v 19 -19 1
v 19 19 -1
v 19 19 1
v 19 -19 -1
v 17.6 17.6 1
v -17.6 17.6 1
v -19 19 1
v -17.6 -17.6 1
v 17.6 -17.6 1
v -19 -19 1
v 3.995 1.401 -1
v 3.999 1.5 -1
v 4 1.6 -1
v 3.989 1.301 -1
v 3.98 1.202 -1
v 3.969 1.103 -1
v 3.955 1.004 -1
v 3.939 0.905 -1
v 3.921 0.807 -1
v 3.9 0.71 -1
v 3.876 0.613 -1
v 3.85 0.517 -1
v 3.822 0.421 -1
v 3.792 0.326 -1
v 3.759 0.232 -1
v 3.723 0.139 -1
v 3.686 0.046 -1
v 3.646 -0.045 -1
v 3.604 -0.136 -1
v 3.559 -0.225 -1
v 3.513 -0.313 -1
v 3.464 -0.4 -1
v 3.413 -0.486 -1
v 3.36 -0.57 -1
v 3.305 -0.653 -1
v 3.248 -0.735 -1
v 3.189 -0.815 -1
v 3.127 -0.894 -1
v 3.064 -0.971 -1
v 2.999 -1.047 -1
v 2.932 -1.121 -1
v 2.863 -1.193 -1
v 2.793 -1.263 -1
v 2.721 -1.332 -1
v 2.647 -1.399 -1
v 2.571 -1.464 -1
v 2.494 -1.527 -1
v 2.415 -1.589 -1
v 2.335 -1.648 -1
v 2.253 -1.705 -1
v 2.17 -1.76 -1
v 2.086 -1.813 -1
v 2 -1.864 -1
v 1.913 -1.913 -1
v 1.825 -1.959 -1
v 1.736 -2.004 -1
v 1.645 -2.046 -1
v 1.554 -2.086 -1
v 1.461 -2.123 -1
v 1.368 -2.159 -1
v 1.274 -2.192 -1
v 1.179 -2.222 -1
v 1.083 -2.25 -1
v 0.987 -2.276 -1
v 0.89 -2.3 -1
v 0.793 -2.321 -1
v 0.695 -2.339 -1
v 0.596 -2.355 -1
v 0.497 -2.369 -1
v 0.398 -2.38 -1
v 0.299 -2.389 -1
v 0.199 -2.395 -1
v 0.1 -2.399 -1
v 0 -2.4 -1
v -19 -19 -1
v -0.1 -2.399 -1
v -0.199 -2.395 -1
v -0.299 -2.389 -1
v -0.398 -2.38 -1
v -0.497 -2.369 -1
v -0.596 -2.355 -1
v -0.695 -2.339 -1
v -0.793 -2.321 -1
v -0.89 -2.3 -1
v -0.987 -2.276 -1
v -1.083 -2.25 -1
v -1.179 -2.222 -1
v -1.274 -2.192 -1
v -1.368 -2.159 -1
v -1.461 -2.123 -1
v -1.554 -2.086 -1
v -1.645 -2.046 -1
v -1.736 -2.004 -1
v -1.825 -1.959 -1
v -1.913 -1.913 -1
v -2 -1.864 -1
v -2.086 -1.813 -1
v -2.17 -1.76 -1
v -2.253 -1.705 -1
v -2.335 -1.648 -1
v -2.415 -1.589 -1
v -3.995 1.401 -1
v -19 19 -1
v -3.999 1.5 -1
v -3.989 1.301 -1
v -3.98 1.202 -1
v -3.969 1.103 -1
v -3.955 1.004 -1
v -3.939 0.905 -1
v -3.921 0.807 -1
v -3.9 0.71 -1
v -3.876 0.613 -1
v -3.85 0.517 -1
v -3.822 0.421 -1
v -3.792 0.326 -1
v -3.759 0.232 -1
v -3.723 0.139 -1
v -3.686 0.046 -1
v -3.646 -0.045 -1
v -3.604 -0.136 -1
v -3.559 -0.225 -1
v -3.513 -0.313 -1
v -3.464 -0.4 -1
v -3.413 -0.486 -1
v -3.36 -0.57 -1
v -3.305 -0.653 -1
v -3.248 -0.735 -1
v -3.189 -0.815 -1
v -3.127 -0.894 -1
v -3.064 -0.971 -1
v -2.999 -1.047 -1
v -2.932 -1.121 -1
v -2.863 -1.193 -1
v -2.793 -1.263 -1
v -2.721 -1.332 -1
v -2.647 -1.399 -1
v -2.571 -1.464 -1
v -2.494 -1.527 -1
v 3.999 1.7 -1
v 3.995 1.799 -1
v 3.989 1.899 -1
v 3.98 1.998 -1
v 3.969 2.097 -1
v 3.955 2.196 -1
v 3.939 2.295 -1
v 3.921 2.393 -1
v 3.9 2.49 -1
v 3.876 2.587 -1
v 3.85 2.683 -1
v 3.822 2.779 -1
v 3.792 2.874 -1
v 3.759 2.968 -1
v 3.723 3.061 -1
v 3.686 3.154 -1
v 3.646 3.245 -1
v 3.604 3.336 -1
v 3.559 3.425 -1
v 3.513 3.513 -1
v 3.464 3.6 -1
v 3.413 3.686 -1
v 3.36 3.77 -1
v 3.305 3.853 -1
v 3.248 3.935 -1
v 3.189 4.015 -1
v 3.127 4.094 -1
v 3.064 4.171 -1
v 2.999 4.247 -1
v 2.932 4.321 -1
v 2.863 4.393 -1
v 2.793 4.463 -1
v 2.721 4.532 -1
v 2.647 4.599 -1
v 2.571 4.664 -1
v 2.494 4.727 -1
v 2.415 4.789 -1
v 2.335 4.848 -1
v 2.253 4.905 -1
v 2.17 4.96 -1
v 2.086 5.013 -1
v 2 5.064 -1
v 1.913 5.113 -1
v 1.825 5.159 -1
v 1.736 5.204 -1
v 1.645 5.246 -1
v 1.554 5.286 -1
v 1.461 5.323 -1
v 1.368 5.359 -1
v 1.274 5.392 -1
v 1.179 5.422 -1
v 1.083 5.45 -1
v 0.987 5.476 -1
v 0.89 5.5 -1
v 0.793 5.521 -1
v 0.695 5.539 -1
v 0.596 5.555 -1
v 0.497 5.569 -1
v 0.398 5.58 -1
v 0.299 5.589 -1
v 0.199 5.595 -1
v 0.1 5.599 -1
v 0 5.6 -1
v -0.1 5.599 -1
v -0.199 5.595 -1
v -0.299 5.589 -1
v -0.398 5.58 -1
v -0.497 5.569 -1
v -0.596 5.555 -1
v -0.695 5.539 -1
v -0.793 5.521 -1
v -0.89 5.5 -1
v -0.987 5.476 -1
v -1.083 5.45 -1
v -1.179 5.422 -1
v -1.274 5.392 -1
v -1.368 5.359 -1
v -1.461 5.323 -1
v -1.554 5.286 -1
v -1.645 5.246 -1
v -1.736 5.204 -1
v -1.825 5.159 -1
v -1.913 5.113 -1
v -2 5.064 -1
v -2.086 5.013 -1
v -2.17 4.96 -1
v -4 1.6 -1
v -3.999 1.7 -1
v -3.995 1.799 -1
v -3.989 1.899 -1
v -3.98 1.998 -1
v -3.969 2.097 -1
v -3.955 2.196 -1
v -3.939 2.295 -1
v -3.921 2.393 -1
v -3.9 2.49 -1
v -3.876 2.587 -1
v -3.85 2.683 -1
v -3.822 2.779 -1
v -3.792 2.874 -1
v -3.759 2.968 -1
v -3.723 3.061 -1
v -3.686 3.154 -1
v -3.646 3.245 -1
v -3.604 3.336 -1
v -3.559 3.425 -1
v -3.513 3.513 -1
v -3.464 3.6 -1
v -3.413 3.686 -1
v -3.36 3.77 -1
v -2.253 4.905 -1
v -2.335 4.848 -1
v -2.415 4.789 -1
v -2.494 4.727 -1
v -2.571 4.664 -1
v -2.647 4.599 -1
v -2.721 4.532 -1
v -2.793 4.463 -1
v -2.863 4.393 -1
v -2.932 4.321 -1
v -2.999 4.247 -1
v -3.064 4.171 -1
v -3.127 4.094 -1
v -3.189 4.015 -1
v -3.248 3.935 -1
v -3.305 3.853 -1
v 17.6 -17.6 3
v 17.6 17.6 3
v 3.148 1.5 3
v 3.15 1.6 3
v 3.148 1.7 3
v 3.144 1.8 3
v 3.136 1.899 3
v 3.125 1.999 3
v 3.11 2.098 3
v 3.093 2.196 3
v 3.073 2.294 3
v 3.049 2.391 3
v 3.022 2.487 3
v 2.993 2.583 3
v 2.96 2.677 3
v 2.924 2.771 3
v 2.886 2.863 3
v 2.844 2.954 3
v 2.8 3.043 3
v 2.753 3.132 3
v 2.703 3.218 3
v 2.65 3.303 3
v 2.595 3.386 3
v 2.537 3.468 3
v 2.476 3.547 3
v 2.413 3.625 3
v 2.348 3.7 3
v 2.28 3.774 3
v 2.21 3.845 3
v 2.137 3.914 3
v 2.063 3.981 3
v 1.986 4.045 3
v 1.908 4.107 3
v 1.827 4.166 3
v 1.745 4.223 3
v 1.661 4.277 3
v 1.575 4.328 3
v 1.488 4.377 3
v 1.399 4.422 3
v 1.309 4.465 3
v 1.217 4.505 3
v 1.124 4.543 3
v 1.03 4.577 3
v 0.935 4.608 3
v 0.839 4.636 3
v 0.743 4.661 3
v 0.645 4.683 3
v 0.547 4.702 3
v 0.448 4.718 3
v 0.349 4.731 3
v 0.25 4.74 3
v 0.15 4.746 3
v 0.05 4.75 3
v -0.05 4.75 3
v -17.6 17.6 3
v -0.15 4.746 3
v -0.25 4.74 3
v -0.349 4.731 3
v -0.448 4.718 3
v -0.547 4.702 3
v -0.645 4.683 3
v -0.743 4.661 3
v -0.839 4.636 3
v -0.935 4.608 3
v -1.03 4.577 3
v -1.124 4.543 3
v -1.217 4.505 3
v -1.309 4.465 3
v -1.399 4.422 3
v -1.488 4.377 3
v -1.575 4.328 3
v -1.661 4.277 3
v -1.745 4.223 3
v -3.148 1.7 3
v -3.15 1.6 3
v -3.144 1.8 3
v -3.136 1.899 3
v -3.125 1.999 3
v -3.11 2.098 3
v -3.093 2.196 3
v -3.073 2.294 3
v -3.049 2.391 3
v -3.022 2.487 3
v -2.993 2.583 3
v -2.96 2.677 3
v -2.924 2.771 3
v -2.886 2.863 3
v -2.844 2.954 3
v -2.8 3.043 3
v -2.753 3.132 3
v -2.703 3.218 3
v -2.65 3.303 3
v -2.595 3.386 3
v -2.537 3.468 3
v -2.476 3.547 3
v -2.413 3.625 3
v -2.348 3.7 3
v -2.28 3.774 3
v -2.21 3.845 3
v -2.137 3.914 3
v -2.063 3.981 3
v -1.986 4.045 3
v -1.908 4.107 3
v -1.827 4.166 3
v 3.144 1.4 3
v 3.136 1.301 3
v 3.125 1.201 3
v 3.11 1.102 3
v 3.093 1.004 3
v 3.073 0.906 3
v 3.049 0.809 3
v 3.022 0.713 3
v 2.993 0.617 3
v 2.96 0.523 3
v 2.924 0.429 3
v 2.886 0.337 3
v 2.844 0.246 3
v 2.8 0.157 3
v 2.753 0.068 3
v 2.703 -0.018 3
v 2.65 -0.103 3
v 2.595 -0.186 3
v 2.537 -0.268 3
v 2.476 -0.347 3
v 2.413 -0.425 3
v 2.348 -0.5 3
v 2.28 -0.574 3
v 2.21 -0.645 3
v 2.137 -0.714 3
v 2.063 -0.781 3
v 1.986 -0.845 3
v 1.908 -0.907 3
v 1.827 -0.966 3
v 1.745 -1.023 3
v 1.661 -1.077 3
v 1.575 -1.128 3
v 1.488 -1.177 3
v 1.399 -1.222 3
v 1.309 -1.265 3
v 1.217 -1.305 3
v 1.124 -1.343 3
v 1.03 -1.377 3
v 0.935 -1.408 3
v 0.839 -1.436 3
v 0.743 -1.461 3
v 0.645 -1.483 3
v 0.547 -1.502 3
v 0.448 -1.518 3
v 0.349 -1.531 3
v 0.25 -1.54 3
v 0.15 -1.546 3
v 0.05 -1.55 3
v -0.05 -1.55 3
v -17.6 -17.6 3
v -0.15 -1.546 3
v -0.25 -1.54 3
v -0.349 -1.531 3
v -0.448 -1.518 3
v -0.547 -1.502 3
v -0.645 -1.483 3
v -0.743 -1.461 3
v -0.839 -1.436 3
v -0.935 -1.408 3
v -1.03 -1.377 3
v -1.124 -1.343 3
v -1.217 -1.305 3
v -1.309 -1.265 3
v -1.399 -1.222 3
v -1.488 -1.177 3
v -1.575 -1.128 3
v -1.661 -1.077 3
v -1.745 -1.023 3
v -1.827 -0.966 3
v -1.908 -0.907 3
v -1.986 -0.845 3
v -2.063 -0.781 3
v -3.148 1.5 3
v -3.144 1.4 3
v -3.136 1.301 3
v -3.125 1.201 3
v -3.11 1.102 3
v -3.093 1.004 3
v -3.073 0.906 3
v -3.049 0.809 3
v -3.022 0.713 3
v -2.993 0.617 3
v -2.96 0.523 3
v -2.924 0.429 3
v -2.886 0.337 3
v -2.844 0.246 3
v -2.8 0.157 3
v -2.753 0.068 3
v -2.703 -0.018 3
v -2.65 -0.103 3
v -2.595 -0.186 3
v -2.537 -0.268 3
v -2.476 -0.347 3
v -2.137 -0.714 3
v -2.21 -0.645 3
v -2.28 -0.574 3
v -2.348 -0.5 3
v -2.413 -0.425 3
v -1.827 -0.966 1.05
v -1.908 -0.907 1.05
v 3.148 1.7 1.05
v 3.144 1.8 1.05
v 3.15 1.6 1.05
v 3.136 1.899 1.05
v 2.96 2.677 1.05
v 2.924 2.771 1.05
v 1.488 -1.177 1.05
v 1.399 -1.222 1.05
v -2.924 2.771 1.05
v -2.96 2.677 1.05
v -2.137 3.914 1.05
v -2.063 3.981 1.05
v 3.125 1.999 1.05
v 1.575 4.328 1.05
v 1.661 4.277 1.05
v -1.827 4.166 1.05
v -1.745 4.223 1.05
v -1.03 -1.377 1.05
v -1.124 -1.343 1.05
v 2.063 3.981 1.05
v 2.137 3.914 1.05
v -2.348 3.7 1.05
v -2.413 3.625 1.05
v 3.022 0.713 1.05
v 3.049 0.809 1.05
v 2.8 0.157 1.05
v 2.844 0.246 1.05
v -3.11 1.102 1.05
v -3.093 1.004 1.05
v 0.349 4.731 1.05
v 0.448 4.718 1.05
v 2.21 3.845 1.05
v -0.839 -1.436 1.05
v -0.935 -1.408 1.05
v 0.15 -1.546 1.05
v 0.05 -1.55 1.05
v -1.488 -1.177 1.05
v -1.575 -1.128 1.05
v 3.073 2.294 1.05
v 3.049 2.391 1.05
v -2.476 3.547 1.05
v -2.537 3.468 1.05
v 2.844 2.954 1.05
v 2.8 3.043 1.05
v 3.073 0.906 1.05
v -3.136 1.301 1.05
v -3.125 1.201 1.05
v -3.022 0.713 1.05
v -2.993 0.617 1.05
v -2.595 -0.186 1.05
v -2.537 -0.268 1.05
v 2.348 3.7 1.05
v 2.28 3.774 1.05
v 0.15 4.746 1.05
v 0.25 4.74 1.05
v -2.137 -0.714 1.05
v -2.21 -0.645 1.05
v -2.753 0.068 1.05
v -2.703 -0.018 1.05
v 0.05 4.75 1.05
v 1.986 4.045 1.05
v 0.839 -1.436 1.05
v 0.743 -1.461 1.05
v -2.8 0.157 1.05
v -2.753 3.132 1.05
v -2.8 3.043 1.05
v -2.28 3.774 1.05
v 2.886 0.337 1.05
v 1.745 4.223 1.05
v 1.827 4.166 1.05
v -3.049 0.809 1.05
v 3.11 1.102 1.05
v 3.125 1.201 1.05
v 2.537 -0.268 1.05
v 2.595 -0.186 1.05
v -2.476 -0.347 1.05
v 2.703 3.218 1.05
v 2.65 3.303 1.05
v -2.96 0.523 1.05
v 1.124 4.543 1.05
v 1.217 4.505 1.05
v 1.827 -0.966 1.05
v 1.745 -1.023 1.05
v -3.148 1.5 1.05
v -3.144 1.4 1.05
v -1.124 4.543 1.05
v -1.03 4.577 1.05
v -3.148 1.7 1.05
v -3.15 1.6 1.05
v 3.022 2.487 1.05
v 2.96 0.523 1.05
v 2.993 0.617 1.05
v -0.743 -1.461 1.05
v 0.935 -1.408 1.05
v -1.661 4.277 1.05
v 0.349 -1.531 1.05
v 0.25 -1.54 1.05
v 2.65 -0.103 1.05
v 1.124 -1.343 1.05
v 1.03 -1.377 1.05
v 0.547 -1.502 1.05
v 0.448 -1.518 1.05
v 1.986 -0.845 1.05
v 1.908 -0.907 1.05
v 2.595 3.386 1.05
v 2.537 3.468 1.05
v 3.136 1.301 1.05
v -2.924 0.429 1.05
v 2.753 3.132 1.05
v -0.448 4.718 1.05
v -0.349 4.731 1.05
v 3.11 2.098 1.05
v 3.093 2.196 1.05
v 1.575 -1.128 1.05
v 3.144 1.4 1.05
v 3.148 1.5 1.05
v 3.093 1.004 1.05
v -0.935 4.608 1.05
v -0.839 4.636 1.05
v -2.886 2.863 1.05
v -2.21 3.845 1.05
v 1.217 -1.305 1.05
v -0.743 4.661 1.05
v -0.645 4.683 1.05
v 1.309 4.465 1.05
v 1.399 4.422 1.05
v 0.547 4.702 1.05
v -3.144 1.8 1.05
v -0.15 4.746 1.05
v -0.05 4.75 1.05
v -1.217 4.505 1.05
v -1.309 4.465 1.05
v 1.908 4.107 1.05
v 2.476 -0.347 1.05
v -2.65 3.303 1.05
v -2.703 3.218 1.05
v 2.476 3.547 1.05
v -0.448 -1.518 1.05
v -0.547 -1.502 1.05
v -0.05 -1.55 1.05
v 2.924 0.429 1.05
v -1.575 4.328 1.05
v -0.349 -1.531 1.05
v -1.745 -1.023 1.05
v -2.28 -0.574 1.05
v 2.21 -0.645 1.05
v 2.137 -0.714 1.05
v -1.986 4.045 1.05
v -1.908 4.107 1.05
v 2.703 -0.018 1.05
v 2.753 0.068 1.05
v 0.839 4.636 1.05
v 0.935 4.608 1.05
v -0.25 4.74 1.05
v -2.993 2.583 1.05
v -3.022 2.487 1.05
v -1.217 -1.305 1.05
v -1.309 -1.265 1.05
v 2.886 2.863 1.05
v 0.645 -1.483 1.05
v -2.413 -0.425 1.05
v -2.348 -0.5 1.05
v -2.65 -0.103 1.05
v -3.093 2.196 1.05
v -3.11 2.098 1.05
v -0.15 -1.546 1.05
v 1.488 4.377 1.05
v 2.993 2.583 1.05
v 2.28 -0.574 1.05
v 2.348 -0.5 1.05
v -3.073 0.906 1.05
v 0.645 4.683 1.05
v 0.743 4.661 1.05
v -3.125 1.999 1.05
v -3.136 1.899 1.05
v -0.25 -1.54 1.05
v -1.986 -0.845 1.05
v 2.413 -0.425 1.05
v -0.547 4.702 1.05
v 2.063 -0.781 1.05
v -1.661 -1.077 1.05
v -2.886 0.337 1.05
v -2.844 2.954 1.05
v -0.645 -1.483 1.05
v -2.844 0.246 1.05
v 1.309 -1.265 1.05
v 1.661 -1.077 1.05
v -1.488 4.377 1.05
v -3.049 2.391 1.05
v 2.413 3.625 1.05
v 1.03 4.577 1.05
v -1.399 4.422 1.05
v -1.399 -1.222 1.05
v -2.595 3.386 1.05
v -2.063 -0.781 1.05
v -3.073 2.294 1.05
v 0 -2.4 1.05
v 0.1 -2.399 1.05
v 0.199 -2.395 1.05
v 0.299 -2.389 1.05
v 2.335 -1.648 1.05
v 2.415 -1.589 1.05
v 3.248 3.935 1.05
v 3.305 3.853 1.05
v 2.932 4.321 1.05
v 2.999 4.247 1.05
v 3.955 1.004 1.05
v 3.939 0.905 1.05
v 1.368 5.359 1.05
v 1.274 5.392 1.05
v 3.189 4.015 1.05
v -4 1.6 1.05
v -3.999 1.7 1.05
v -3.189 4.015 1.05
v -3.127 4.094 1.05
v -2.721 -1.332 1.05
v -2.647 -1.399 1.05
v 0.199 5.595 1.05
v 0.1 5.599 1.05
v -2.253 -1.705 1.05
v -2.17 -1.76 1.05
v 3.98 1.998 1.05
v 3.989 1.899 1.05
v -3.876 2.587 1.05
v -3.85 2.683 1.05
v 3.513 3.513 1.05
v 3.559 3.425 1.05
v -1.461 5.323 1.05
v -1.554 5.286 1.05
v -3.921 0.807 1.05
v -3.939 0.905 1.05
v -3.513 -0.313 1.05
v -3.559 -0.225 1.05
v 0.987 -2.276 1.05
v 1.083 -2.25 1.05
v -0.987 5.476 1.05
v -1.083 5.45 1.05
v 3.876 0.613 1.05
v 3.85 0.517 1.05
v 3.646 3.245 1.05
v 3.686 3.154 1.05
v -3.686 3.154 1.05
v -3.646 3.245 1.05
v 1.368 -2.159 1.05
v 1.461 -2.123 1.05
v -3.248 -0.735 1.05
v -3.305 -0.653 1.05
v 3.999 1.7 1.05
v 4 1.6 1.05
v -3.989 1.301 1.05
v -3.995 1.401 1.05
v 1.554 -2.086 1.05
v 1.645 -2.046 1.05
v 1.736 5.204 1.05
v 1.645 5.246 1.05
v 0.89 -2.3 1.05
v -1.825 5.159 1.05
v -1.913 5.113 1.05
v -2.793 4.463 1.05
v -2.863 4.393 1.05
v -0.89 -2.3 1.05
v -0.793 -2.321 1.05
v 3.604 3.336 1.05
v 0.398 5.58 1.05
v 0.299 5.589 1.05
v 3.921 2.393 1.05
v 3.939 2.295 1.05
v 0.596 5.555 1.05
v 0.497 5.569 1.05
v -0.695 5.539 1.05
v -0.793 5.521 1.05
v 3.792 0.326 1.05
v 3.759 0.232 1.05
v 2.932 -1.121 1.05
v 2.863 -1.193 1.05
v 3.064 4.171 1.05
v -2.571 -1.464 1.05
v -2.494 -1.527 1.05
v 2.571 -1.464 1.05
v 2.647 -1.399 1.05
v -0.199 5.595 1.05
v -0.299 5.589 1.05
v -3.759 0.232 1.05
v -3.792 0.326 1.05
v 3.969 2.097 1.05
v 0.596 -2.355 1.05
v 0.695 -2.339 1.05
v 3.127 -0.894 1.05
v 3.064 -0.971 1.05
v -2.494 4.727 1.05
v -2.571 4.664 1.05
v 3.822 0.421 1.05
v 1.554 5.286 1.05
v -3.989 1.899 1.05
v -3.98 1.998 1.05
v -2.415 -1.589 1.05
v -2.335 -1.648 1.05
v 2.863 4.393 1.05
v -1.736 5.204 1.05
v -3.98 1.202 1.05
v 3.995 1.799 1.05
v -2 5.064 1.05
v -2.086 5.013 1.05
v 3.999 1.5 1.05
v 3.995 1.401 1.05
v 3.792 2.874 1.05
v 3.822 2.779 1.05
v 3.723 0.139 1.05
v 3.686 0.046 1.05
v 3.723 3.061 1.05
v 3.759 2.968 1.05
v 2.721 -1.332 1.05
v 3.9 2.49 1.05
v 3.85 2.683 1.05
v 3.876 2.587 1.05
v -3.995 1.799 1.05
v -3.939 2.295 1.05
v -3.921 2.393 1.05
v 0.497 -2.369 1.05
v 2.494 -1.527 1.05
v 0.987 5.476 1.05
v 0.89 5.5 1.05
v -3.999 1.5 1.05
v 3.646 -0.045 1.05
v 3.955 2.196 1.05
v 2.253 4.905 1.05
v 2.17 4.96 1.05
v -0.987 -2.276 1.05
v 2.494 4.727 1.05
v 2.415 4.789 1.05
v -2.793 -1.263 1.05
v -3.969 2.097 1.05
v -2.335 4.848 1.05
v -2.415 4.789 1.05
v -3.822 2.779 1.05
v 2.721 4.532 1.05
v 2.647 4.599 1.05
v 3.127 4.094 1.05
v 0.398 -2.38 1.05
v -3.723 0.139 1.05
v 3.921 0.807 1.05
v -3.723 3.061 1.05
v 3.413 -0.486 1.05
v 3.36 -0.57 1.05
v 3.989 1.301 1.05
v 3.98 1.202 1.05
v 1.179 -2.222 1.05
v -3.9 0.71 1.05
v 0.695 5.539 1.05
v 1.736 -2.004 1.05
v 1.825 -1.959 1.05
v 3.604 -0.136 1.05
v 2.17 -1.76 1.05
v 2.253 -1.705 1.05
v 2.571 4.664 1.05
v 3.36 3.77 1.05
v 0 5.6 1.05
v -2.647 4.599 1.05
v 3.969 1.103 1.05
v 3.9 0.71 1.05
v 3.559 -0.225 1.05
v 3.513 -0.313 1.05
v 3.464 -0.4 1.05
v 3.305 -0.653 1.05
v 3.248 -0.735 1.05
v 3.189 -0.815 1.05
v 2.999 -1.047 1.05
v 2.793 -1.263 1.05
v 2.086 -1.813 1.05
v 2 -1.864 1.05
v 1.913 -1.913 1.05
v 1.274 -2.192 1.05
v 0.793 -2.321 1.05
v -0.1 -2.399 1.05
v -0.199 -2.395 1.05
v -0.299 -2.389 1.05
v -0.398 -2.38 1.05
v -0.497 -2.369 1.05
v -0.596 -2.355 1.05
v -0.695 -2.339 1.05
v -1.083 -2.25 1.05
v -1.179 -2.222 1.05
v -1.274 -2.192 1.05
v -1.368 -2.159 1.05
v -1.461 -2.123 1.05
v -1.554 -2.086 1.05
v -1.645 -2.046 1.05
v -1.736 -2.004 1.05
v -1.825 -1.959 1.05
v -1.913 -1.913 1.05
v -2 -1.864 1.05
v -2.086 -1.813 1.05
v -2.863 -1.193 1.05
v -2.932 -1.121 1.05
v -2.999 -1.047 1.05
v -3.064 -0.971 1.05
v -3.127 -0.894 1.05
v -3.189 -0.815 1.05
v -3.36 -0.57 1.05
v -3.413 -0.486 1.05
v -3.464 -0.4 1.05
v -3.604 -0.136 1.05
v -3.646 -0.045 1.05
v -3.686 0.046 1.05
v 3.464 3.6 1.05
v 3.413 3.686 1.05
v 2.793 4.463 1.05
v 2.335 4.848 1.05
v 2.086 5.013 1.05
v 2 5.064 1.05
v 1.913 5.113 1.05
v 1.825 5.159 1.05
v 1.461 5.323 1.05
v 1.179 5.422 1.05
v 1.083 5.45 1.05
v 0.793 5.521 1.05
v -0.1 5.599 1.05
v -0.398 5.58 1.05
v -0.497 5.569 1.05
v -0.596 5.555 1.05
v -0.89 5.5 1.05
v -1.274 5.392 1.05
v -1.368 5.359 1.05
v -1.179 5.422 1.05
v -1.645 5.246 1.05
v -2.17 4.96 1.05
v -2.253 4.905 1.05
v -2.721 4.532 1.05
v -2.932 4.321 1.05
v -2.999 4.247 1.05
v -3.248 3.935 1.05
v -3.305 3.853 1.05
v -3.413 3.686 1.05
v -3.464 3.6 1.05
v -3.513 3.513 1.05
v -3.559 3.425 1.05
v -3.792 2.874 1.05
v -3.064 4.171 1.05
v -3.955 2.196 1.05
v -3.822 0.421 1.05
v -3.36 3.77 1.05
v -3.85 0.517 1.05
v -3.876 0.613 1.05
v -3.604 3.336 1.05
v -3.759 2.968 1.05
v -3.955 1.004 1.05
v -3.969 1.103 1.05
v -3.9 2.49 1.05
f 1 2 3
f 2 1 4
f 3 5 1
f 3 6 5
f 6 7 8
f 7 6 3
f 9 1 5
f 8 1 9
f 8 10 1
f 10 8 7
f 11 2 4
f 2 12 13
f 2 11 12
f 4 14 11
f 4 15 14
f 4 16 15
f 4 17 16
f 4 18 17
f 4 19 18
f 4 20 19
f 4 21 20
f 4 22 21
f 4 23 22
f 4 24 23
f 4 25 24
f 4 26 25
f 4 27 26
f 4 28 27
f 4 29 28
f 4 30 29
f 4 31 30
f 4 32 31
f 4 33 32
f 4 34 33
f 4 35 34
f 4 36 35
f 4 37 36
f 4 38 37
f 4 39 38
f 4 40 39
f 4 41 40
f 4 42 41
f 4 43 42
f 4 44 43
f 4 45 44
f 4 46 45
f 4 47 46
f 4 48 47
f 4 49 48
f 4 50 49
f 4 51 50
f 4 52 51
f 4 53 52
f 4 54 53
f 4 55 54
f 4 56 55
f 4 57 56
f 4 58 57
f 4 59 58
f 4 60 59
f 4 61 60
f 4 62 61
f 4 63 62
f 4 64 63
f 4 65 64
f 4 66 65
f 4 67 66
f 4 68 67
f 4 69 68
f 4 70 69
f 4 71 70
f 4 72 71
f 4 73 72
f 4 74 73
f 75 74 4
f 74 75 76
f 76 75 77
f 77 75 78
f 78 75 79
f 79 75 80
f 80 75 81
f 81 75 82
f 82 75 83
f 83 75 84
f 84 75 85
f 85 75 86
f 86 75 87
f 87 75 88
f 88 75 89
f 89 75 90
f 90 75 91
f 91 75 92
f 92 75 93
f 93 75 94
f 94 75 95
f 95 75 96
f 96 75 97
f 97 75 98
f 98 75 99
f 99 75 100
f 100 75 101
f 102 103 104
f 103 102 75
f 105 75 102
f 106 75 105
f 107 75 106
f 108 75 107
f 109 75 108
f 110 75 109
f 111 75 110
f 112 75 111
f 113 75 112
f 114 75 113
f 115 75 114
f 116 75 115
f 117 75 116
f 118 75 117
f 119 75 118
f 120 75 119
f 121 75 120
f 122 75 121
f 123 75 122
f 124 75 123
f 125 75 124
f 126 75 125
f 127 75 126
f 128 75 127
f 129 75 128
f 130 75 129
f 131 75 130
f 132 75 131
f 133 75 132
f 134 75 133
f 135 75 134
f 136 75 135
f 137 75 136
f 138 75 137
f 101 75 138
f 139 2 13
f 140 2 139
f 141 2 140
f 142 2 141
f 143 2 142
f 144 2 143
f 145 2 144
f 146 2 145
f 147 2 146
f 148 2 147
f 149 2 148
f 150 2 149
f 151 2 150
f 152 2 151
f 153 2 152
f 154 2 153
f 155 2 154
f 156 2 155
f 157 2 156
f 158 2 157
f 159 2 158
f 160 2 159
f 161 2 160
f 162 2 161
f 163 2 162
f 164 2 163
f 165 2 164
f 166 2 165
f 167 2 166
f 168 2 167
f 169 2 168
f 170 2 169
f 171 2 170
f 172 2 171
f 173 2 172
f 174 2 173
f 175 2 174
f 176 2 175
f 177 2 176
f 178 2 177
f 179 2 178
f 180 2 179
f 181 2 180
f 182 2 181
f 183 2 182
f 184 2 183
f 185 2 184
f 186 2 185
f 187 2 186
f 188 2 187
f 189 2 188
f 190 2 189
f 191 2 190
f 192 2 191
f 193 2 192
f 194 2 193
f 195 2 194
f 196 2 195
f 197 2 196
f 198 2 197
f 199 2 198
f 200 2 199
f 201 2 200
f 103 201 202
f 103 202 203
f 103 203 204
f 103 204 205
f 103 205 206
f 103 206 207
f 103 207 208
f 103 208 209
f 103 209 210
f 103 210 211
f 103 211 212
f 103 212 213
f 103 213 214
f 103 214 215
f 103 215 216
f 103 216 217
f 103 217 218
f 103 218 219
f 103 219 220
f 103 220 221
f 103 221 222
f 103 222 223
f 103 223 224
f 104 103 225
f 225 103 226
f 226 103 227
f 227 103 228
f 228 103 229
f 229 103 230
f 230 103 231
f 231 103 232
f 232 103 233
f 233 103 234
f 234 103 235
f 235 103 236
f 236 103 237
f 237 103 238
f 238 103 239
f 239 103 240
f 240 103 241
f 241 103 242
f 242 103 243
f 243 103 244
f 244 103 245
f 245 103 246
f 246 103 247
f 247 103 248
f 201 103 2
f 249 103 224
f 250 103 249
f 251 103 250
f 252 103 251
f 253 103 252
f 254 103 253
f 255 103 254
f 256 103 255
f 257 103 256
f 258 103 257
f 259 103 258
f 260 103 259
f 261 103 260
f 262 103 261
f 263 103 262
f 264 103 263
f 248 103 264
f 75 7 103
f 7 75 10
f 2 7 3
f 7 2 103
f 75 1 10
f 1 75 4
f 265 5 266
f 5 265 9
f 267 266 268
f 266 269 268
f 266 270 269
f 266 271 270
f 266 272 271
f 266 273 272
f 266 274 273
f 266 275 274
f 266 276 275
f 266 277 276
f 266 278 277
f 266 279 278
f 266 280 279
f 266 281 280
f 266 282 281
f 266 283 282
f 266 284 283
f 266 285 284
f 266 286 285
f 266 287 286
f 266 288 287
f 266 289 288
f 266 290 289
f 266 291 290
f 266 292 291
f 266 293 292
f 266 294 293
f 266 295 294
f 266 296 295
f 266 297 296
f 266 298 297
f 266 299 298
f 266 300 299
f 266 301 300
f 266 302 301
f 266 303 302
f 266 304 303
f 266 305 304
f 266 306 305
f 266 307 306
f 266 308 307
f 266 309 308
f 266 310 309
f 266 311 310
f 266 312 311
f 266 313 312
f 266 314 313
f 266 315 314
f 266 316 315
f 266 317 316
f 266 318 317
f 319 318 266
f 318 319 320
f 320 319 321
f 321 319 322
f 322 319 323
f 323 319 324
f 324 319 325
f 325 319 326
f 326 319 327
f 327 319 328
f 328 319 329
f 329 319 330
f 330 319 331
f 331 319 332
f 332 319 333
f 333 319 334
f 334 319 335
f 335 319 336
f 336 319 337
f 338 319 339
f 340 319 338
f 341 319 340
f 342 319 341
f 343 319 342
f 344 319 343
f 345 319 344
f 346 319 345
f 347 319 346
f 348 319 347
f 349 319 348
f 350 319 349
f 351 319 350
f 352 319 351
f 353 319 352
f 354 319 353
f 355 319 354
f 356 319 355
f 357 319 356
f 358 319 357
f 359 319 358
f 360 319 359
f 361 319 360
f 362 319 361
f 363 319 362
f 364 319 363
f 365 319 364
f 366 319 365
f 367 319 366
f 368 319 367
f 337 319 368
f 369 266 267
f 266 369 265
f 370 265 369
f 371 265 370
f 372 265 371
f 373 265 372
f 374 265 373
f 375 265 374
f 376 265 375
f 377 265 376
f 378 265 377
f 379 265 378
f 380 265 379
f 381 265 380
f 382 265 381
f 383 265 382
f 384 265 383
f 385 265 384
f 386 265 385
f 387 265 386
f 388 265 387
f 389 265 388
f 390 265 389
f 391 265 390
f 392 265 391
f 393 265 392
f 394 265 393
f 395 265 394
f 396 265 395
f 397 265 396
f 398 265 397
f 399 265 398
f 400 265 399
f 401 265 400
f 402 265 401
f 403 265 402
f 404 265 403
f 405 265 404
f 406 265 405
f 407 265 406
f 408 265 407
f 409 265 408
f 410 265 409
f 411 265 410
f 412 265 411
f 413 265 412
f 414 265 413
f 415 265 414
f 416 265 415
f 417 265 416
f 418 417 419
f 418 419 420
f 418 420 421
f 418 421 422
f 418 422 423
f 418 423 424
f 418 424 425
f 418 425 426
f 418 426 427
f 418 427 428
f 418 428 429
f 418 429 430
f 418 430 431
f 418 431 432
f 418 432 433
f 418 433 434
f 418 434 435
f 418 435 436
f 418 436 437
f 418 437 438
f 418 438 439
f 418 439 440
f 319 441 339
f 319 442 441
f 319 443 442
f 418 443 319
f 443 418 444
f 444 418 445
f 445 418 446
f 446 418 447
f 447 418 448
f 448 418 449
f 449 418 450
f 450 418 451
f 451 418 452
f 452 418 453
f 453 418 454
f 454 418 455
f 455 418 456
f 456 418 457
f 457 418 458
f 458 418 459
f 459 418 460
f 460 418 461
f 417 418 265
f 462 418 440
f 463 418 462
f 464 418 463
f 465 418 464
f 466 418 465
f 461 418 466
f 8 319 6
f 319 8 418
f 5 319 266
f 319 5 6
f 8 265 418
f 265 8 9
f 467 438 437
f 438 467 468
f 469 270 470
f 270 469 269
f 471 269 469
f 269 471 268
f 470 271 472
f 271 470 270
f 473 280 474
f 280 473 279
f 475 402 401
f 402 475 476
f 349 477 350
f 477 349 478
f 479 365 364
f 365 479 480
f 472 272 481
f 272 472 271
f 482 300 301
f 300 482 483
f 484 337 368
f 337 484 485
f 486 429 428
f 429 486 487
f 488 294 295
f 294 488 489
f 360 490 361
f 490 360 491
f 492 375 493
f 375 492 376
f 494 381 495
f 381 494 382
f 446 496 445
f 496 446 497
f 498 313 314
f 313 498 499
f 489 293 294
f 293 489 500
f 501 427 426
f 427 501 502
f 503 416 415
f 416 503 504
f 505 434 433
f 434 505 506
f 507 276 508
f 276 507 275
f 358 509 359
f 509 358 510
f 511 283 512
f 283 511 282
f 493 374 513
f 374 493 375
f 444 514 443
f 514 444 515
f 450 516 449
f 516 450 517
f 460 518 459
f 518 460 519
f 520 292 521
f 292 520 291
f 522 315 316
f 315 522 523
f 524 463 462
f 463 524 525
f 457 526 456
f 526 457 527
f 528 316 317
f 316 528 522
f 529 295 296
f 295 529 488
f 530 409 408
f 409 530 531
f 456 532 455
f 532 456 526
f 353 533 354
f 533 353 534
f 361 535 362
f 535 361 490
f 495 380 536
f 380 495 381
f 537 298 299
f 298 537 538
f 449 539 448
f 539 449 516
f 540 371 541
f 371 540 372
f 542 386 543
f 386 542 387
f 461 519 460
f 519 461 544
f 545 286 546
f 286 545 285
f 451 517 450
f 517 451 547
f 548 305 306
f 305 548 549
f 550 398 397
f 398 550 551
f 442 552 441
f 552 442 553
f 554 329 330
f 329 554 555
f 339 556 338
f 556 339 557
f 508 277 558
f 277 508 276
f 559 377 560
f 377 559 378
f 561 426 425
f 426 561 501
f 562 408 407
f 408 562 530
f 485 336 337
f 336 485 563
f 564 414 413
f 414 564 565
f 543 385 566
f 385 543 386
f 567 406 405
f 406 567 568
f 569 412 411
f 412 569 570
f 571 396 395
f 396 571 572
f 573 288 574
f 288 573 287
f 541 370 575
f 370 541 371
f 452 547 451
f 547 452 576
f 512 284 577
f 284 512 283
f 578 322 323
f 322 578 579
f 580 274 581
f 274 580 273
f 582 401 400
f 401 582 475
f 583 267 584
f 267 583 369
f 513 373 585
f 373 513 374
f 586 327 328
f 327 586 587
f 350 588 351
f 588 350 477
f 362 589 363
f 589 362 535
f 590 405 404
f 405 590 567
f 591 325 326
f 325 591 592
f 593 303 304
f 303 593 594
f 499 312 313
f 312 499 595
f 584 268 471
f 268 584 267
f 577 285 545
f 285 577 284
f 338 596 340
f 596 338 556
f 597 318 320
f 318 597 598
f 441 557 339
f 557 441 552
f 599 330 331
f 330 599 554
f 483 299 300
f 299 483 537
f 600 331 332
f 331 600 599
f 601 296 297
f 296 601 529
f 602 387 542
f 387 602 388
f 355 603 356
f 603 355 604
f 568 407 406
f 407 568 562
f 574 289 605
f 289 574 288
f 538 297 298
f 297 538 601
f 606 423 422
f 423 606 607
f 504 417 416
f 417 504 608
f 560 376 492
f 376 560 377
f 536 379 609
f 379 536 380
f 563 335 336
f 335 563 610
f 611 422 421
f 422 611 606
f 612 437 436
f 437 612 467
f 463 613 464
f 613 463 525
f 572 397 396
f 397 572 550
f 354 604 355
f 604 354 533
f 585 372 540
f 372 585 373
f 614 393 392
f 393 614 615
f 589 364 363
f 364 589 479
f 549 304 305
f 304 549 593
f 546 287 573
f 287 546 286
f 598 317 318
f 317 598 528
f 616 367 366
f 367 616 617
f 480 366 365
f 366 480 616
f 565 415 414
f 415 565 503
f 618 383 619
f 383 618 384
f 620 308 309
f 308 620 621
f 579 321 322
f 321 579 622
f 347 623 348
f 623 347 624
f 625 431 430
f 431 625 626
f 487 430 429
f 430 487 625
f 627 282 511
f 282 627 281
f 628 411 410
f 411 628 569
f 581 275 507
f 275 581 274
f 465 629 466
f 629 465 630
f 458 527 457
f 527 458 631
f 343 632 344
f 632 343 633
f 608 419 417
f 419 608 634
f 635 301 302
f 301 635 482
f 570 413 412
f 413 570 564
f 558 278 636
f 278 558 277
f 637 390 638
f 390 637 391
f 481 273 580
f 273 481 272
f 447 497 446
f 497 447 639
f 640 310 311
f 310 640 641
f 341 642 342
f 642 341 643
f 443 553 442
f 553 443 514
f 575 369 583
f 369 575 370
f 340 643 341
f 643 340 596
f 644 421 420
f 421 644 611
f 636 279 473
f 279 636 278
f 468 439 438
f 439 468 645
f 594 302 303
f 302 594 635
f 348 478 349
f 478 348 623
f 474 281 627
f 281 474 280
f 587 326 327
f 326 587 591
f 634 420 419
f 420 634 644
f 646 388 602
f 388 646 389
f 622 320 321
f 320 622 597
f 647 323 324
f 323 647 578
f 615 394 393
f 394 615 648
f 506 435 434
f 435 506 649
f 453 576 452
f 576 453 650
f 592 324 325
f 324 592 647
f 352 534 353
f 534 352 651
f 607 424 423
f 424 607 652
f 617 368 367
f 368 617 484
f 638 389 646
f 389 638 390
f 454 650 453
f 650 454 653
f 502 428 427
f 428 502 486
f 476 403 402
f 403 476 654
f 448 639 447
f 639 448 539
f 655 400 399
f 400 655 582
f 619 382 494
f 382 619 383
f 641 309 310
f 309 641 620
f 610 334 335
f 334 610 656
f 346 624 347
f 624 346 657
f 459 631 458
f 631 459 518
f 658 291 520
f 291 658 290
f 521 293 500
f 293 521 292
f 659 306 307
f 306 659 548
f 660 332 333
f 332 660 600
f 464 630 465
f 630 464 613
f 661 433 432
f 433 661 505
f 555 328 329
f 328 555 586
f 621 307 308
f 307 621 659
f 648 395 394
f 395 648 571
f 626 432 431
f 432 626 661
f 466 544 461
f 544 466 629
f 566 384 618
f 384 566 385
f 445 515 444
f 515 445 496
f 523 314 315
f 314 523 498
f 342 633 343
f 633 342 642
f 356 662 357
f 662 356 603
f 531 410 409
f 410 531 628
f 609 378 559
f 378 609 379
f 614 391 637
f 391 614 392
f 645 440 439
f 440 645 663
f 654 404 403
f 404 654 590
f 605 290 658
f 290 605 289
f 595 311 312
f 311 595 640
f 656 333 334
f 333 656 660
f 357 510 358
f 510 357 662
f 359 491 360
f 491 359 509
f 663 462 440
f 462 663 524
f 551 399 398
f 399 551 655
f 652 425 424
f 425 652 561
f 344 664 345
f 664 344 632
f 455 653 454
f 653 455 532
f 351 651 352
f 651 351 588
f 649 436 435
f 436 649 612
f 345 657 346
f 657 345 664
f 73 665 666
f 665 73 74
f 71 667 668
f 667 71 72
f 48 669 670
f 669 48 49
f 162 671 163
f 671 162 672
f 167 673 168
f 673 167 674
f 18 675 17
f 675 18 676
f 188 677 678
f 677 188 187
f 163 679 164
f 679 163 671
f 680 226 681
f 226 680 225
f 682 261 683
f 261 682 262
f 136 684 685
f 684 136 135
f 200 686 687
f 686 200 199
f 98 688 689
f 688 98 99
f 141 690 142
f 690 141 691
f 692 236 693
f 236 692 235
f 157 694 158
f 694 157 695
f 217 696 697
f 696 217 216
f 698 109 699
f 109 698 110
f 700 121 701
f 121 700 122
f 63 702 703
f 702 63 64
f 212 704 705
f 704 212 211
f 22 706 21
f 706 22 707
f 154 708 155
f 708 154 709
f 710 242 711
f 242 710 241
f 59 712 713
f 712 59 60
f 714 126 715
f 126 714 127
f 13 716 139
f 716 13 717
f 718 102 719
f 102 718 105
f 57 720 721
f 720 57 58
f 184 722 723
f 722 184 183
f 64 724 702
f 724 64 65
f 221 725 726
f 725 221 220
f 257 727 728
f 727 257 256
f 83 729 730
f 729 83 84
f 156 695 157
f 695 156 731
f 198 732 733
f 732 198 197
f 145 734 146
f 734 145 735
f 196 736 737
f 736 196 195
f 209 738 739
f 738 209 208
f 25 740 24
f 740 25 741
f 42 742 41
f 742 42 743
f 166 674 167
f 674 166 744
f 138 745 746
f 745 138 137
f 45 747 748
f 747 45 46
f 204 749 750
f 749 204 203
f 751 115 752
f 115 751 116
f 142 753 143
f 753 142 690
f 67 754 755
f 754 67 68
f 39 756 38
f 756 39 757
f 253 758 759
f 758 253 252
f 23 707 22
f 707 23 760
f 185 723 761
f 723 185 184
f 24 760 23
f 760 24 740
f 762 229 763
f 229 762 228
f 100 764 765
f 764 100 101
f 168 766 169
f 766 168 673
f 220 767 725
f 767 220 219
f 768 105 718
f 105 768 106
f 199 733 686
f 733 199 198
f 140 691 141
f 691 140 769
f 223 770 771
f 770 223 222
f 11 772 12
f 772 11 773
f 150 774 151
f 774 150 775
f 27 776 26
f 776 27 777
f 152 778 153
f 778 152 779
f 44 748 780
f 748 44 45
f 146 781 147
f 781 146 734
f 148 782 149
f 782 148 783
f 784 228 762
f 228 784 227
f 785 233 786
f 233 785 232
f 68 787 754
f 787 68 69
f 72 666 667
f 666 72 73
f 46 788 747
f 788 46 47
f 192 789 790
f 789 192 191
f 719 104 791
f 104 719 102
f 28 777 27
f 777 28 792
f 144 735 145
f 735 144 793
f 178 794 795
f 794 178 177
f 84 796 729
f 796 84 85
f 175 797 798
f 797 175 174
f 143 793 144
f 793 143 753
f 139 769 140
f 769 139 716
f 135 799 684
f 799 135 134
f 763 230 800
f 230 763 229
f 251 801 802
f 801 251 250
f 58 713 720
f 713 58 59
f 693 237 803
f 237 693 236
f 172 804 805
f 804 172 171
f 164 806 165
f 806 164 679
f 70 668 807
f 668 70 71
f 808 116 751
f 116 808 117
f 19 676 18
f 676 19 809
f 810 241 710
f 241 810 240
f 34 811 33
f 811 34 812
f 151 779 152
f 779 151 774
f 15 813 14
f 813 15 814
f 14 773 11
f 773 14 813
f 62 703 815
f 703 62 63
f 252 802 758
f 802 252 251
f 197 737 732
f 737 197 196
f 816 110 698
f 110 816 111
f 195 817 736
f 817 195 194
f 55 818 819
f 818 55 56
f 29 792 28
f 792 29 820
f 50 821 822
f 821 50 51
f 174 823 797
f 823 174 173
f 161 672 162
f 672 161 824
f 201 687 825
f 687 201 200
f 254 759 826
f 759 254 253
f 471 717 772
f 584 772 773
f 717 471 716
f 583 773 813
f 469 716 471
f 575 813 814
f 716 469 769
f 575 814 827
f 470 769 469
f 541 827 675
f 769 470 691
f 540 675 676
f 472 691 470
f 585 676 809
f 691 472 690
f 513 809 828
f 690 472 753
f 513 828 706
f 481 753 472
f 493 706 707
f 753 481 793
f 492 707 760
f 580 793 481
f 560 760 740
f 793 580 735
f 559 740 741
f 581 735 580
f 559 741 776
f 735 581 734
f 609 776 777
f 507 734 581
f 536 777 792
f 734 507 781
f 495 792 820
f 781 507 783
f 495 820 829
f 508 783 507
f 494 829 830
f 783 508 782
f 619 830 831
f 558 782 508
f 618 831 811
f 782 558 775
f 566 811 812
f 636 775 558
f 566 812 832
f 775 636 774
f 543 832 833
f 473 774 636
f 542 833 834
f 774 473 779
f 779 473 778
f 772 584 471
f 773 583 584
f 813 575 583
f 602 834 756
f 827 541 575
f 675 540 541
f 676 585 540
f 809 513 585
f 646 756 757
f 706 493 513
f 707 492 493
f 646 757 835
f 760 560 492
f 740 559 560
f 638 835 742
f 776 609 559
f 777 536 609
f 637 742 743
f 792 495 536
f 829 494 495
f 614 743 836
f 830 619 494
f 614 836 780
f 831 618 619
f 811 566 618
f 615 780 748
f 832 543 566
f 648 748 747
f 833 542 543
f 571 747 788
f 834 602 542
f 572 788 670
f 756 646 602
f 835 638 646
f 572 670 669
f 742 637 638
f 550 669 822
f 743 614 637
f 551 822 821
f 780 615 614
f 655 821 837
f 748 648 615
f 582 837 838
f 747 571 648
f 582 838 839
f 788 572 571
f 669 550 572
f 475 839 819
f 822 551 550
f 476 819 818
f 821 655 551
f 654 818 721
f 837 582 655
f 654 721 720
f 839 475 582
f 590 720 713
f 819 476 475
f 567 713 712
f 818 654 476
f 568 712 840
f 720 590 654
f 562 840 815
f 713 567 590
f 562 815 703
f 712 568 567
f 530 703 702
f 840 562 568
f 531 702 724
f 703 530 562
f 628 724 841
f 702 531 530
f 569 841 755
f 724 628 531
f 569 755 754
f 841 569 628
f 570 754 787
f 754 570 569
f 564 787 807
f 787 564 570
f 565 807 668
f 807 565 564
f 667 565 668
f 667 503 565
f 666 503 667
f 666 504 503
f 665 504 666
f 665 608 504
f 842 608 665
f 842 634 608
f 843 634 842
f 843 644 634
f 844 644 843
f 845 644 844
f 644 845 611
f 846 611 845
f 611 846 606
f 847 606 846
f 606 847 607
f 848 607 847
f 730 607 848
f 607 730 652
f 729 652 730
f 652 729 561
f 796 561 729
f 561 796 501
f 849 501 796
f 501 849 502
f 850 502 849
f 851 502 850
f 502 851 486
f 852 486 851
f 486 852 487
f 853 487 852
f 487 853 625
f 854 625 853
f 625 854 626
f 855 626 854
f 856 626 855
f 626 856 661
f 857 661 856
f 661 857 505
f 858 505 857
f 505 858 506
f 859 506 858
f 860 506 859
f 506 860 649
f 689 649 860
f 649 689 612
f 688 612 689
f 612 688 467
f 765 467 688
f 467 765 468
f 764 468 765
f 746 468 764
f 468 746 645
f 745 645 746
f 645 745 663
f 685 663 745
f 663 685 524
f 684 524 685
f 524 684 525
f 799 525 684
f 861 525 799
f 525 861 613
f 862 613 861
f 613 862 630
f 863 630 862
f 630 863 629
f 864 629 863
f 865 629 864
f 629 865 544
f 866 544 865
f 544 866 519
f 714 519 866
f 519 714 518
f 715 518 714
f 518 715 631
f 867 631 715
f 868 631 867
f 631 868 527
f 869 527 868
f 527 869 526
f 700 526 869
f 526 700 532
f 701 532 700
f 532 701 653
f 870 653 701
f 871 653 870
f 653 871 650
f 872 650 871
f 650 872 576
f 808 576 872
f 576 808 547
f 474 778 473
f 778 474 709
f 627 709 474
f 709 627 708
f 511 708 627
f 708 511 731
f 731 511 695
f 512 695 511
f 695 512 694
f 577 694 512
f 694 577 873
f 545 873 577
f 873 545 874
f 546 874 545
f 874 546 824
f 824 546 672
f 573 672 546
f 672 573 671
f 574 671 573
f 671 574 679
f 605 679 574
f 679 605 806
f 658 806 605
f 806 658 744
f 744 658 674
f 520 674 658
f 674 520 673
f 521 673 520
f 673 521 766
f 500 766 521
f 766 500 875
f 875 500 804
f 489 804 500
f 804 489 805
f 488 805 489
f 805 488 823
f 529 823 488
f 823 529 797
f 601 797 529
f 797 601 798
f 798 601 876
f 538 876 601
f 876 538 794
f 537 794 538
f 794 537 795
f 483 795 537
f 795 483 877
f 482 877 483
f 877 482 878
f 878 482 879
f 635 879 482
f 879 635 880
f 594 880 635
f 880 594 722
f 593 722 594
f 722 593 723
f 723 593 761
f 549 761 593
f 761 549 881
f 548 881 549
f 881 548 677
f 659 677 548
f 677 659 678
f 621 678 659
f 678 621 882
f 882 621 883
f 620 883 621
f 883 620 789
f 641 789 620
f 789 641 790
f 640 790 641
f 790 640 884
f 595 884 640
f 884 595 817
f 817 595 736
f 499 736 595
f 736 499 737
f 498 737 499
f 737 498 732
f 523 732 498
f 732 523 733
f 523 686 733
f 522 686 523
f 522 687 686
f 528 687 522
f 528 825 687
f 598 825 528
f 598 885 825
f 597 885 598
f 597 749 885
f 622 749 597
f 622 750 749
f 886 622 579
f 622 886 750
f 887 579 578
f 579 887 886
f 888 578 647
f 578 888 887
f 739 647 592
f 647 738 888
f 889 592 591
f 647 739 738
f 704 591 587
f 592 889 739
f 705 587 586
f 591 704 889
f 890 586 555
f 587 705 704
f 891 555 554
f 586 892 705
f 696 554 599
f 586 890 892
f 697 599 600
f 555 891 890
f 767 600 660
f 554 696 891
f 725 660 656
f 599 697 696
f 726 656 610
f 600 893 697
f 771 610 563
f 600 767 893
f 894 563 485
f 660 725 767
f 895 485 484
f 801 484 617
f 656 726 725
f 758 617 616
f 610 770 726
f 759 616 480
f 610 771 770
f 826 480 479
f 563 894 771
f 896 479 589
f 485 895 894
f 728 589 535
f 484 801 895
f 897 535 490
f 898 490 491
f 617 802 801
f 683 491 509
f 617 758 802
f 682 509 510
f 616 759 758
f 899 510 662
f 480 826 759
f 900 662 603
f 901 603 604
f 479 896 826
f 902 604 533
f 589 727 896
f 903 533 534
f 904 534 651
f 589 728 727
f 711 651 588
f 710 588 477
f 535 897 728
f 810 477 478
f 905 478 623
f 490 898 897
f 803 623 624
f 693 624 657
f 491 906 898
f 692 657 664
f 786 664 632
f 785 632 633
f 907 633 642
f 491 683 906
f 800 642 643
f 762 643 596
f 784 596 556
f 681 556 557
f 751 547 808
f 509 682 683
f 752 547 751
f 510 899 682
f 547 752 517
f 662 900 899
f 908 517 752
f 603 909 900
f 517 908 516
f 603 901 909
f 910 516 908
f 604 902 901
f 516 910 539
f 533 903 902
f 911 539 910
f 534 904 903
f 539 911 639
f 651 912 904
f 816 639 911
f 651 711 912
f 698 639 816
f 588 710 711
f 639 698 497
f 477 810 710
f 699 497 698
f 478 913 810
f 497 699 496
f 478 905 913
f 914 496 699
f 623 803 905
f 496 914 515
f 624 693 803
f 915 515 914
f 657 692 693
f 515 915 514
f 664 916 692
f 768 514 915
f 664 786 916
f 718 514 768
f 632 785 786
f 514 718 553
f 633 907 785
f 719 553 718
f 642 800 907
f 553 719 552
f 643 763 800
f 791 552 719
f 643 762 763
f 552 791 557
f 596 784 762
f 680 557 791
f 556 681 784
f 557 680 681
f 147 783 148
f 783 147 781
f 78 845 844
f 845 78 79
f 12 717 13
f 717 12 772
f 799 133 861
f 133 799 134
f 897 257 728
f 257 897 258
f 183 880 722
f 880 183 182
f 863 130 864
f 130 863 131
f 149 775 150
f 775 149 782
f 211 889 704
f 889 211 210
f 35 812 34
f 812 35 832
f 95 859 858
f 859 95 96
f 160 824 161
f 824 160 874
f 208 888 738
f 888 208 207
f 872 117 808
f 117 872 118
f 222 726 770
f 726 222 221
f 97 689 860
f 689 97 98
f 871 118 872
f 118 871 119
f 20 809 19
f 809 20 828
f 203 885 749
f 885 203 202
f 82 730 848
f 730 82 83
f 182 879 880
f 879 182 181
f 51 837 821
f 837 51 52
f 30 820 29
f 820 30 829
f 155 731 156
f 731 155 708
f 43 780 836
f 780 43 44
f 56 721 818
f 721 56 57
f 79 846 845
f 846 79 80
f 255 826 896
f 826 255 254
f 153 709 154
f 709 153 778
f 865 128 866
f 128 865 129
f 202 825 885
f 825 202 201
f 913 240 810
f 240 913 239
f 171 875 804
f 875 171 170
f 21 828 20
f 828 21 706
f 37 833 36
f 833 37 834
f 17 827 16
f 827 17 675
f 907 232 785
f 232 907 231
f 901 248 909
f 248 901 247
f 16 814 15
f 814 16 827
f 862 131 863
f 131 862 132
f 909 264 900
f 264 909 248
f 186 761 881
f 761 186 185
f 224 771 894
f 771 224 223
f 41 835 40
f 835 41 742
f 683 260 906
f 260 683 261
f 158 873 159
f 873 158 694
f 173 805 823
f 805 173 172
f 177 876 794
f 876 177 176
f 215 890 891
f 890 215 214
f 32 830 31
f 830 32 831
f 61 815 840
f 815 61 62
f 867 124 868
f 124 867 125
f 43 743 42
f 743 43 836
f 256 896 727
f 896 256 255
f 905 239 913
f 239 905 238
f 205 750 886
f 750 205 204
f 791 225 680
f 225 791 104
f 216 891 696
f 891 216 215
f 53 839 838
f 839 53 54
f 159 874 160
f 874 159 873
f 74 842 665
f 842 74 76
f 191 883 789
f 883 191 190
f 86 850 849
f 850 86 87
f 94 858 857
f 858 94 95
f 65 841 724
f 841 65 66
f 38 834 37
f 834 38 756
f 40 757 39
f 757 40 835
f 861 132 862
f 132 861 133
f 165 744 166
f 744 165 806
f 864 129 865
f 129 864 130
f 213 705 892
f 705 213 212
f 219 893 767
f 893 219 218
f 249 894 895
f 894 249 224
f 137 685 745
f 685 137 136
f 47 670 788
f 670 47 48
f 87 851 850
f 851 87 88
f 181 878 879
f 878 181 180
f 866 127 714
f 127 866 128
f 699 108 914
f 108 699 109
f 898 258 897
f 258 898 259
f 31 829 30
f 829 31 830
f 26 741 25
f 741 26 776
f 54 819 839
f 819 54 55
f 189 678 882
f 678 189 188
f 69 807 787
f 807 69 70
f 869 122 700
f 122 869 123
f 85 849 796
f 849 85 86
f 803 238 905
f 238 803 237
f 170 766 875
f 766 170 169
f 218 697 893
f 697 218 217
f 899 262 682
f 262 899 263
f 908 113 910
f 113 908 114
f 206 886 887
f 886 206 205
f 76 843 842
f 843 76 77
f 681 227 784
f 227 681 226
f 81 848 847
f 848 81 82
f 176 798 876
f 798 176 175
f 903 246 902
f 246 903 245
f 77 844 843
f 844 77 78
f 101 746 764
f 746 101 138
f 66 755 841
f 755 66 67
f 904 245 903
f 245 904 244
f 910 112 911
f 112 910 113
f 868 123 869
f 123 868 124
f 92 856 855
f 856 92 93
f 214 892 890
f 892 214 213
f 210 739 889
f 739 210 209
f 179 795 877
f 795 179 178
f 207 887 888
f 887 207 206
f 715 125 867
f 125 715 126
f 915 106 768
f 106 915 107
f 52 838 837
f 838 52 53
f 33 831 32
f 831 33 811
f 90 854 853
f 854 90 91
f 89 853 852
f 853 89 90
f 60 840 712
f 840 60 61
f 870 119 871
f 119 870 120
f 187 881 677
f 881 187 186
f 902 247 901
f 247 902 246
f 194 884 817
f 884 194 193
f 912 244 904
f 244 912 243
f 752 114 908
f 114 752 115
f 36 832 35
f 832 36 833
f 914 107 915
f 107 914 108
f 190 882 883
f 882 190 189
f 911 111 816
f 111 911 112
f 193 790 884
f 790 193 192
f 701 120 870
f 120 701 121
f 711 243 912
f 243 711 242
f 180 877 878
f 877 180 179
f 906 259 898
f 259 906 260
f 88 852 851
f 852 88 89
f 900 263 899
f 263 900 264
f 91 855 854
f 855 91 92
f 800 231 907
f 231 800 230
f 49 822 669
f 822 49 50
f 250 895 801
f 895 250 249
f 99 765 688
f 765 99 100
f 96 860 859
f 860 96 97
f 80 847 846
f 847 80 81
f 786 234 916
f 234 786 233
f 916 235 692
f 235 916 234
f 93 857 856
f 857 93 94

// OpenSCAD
  $fa=.1; // default minimum facet angle is now 0.5
  $fs=.1; // default minimum facet size is now 0.5 mm

difference(){
union(){
cube([38,38,2],center=true);

translate([0,0,2]){cube([35.2,35.2,2],center=true);}
}

translate([0,1.6,2]){cylinder(h=2.1,r=3.15,center=true);}
translate([0,1.6,0]){cylinder(h=2.1,r=4,center=true);}
}
